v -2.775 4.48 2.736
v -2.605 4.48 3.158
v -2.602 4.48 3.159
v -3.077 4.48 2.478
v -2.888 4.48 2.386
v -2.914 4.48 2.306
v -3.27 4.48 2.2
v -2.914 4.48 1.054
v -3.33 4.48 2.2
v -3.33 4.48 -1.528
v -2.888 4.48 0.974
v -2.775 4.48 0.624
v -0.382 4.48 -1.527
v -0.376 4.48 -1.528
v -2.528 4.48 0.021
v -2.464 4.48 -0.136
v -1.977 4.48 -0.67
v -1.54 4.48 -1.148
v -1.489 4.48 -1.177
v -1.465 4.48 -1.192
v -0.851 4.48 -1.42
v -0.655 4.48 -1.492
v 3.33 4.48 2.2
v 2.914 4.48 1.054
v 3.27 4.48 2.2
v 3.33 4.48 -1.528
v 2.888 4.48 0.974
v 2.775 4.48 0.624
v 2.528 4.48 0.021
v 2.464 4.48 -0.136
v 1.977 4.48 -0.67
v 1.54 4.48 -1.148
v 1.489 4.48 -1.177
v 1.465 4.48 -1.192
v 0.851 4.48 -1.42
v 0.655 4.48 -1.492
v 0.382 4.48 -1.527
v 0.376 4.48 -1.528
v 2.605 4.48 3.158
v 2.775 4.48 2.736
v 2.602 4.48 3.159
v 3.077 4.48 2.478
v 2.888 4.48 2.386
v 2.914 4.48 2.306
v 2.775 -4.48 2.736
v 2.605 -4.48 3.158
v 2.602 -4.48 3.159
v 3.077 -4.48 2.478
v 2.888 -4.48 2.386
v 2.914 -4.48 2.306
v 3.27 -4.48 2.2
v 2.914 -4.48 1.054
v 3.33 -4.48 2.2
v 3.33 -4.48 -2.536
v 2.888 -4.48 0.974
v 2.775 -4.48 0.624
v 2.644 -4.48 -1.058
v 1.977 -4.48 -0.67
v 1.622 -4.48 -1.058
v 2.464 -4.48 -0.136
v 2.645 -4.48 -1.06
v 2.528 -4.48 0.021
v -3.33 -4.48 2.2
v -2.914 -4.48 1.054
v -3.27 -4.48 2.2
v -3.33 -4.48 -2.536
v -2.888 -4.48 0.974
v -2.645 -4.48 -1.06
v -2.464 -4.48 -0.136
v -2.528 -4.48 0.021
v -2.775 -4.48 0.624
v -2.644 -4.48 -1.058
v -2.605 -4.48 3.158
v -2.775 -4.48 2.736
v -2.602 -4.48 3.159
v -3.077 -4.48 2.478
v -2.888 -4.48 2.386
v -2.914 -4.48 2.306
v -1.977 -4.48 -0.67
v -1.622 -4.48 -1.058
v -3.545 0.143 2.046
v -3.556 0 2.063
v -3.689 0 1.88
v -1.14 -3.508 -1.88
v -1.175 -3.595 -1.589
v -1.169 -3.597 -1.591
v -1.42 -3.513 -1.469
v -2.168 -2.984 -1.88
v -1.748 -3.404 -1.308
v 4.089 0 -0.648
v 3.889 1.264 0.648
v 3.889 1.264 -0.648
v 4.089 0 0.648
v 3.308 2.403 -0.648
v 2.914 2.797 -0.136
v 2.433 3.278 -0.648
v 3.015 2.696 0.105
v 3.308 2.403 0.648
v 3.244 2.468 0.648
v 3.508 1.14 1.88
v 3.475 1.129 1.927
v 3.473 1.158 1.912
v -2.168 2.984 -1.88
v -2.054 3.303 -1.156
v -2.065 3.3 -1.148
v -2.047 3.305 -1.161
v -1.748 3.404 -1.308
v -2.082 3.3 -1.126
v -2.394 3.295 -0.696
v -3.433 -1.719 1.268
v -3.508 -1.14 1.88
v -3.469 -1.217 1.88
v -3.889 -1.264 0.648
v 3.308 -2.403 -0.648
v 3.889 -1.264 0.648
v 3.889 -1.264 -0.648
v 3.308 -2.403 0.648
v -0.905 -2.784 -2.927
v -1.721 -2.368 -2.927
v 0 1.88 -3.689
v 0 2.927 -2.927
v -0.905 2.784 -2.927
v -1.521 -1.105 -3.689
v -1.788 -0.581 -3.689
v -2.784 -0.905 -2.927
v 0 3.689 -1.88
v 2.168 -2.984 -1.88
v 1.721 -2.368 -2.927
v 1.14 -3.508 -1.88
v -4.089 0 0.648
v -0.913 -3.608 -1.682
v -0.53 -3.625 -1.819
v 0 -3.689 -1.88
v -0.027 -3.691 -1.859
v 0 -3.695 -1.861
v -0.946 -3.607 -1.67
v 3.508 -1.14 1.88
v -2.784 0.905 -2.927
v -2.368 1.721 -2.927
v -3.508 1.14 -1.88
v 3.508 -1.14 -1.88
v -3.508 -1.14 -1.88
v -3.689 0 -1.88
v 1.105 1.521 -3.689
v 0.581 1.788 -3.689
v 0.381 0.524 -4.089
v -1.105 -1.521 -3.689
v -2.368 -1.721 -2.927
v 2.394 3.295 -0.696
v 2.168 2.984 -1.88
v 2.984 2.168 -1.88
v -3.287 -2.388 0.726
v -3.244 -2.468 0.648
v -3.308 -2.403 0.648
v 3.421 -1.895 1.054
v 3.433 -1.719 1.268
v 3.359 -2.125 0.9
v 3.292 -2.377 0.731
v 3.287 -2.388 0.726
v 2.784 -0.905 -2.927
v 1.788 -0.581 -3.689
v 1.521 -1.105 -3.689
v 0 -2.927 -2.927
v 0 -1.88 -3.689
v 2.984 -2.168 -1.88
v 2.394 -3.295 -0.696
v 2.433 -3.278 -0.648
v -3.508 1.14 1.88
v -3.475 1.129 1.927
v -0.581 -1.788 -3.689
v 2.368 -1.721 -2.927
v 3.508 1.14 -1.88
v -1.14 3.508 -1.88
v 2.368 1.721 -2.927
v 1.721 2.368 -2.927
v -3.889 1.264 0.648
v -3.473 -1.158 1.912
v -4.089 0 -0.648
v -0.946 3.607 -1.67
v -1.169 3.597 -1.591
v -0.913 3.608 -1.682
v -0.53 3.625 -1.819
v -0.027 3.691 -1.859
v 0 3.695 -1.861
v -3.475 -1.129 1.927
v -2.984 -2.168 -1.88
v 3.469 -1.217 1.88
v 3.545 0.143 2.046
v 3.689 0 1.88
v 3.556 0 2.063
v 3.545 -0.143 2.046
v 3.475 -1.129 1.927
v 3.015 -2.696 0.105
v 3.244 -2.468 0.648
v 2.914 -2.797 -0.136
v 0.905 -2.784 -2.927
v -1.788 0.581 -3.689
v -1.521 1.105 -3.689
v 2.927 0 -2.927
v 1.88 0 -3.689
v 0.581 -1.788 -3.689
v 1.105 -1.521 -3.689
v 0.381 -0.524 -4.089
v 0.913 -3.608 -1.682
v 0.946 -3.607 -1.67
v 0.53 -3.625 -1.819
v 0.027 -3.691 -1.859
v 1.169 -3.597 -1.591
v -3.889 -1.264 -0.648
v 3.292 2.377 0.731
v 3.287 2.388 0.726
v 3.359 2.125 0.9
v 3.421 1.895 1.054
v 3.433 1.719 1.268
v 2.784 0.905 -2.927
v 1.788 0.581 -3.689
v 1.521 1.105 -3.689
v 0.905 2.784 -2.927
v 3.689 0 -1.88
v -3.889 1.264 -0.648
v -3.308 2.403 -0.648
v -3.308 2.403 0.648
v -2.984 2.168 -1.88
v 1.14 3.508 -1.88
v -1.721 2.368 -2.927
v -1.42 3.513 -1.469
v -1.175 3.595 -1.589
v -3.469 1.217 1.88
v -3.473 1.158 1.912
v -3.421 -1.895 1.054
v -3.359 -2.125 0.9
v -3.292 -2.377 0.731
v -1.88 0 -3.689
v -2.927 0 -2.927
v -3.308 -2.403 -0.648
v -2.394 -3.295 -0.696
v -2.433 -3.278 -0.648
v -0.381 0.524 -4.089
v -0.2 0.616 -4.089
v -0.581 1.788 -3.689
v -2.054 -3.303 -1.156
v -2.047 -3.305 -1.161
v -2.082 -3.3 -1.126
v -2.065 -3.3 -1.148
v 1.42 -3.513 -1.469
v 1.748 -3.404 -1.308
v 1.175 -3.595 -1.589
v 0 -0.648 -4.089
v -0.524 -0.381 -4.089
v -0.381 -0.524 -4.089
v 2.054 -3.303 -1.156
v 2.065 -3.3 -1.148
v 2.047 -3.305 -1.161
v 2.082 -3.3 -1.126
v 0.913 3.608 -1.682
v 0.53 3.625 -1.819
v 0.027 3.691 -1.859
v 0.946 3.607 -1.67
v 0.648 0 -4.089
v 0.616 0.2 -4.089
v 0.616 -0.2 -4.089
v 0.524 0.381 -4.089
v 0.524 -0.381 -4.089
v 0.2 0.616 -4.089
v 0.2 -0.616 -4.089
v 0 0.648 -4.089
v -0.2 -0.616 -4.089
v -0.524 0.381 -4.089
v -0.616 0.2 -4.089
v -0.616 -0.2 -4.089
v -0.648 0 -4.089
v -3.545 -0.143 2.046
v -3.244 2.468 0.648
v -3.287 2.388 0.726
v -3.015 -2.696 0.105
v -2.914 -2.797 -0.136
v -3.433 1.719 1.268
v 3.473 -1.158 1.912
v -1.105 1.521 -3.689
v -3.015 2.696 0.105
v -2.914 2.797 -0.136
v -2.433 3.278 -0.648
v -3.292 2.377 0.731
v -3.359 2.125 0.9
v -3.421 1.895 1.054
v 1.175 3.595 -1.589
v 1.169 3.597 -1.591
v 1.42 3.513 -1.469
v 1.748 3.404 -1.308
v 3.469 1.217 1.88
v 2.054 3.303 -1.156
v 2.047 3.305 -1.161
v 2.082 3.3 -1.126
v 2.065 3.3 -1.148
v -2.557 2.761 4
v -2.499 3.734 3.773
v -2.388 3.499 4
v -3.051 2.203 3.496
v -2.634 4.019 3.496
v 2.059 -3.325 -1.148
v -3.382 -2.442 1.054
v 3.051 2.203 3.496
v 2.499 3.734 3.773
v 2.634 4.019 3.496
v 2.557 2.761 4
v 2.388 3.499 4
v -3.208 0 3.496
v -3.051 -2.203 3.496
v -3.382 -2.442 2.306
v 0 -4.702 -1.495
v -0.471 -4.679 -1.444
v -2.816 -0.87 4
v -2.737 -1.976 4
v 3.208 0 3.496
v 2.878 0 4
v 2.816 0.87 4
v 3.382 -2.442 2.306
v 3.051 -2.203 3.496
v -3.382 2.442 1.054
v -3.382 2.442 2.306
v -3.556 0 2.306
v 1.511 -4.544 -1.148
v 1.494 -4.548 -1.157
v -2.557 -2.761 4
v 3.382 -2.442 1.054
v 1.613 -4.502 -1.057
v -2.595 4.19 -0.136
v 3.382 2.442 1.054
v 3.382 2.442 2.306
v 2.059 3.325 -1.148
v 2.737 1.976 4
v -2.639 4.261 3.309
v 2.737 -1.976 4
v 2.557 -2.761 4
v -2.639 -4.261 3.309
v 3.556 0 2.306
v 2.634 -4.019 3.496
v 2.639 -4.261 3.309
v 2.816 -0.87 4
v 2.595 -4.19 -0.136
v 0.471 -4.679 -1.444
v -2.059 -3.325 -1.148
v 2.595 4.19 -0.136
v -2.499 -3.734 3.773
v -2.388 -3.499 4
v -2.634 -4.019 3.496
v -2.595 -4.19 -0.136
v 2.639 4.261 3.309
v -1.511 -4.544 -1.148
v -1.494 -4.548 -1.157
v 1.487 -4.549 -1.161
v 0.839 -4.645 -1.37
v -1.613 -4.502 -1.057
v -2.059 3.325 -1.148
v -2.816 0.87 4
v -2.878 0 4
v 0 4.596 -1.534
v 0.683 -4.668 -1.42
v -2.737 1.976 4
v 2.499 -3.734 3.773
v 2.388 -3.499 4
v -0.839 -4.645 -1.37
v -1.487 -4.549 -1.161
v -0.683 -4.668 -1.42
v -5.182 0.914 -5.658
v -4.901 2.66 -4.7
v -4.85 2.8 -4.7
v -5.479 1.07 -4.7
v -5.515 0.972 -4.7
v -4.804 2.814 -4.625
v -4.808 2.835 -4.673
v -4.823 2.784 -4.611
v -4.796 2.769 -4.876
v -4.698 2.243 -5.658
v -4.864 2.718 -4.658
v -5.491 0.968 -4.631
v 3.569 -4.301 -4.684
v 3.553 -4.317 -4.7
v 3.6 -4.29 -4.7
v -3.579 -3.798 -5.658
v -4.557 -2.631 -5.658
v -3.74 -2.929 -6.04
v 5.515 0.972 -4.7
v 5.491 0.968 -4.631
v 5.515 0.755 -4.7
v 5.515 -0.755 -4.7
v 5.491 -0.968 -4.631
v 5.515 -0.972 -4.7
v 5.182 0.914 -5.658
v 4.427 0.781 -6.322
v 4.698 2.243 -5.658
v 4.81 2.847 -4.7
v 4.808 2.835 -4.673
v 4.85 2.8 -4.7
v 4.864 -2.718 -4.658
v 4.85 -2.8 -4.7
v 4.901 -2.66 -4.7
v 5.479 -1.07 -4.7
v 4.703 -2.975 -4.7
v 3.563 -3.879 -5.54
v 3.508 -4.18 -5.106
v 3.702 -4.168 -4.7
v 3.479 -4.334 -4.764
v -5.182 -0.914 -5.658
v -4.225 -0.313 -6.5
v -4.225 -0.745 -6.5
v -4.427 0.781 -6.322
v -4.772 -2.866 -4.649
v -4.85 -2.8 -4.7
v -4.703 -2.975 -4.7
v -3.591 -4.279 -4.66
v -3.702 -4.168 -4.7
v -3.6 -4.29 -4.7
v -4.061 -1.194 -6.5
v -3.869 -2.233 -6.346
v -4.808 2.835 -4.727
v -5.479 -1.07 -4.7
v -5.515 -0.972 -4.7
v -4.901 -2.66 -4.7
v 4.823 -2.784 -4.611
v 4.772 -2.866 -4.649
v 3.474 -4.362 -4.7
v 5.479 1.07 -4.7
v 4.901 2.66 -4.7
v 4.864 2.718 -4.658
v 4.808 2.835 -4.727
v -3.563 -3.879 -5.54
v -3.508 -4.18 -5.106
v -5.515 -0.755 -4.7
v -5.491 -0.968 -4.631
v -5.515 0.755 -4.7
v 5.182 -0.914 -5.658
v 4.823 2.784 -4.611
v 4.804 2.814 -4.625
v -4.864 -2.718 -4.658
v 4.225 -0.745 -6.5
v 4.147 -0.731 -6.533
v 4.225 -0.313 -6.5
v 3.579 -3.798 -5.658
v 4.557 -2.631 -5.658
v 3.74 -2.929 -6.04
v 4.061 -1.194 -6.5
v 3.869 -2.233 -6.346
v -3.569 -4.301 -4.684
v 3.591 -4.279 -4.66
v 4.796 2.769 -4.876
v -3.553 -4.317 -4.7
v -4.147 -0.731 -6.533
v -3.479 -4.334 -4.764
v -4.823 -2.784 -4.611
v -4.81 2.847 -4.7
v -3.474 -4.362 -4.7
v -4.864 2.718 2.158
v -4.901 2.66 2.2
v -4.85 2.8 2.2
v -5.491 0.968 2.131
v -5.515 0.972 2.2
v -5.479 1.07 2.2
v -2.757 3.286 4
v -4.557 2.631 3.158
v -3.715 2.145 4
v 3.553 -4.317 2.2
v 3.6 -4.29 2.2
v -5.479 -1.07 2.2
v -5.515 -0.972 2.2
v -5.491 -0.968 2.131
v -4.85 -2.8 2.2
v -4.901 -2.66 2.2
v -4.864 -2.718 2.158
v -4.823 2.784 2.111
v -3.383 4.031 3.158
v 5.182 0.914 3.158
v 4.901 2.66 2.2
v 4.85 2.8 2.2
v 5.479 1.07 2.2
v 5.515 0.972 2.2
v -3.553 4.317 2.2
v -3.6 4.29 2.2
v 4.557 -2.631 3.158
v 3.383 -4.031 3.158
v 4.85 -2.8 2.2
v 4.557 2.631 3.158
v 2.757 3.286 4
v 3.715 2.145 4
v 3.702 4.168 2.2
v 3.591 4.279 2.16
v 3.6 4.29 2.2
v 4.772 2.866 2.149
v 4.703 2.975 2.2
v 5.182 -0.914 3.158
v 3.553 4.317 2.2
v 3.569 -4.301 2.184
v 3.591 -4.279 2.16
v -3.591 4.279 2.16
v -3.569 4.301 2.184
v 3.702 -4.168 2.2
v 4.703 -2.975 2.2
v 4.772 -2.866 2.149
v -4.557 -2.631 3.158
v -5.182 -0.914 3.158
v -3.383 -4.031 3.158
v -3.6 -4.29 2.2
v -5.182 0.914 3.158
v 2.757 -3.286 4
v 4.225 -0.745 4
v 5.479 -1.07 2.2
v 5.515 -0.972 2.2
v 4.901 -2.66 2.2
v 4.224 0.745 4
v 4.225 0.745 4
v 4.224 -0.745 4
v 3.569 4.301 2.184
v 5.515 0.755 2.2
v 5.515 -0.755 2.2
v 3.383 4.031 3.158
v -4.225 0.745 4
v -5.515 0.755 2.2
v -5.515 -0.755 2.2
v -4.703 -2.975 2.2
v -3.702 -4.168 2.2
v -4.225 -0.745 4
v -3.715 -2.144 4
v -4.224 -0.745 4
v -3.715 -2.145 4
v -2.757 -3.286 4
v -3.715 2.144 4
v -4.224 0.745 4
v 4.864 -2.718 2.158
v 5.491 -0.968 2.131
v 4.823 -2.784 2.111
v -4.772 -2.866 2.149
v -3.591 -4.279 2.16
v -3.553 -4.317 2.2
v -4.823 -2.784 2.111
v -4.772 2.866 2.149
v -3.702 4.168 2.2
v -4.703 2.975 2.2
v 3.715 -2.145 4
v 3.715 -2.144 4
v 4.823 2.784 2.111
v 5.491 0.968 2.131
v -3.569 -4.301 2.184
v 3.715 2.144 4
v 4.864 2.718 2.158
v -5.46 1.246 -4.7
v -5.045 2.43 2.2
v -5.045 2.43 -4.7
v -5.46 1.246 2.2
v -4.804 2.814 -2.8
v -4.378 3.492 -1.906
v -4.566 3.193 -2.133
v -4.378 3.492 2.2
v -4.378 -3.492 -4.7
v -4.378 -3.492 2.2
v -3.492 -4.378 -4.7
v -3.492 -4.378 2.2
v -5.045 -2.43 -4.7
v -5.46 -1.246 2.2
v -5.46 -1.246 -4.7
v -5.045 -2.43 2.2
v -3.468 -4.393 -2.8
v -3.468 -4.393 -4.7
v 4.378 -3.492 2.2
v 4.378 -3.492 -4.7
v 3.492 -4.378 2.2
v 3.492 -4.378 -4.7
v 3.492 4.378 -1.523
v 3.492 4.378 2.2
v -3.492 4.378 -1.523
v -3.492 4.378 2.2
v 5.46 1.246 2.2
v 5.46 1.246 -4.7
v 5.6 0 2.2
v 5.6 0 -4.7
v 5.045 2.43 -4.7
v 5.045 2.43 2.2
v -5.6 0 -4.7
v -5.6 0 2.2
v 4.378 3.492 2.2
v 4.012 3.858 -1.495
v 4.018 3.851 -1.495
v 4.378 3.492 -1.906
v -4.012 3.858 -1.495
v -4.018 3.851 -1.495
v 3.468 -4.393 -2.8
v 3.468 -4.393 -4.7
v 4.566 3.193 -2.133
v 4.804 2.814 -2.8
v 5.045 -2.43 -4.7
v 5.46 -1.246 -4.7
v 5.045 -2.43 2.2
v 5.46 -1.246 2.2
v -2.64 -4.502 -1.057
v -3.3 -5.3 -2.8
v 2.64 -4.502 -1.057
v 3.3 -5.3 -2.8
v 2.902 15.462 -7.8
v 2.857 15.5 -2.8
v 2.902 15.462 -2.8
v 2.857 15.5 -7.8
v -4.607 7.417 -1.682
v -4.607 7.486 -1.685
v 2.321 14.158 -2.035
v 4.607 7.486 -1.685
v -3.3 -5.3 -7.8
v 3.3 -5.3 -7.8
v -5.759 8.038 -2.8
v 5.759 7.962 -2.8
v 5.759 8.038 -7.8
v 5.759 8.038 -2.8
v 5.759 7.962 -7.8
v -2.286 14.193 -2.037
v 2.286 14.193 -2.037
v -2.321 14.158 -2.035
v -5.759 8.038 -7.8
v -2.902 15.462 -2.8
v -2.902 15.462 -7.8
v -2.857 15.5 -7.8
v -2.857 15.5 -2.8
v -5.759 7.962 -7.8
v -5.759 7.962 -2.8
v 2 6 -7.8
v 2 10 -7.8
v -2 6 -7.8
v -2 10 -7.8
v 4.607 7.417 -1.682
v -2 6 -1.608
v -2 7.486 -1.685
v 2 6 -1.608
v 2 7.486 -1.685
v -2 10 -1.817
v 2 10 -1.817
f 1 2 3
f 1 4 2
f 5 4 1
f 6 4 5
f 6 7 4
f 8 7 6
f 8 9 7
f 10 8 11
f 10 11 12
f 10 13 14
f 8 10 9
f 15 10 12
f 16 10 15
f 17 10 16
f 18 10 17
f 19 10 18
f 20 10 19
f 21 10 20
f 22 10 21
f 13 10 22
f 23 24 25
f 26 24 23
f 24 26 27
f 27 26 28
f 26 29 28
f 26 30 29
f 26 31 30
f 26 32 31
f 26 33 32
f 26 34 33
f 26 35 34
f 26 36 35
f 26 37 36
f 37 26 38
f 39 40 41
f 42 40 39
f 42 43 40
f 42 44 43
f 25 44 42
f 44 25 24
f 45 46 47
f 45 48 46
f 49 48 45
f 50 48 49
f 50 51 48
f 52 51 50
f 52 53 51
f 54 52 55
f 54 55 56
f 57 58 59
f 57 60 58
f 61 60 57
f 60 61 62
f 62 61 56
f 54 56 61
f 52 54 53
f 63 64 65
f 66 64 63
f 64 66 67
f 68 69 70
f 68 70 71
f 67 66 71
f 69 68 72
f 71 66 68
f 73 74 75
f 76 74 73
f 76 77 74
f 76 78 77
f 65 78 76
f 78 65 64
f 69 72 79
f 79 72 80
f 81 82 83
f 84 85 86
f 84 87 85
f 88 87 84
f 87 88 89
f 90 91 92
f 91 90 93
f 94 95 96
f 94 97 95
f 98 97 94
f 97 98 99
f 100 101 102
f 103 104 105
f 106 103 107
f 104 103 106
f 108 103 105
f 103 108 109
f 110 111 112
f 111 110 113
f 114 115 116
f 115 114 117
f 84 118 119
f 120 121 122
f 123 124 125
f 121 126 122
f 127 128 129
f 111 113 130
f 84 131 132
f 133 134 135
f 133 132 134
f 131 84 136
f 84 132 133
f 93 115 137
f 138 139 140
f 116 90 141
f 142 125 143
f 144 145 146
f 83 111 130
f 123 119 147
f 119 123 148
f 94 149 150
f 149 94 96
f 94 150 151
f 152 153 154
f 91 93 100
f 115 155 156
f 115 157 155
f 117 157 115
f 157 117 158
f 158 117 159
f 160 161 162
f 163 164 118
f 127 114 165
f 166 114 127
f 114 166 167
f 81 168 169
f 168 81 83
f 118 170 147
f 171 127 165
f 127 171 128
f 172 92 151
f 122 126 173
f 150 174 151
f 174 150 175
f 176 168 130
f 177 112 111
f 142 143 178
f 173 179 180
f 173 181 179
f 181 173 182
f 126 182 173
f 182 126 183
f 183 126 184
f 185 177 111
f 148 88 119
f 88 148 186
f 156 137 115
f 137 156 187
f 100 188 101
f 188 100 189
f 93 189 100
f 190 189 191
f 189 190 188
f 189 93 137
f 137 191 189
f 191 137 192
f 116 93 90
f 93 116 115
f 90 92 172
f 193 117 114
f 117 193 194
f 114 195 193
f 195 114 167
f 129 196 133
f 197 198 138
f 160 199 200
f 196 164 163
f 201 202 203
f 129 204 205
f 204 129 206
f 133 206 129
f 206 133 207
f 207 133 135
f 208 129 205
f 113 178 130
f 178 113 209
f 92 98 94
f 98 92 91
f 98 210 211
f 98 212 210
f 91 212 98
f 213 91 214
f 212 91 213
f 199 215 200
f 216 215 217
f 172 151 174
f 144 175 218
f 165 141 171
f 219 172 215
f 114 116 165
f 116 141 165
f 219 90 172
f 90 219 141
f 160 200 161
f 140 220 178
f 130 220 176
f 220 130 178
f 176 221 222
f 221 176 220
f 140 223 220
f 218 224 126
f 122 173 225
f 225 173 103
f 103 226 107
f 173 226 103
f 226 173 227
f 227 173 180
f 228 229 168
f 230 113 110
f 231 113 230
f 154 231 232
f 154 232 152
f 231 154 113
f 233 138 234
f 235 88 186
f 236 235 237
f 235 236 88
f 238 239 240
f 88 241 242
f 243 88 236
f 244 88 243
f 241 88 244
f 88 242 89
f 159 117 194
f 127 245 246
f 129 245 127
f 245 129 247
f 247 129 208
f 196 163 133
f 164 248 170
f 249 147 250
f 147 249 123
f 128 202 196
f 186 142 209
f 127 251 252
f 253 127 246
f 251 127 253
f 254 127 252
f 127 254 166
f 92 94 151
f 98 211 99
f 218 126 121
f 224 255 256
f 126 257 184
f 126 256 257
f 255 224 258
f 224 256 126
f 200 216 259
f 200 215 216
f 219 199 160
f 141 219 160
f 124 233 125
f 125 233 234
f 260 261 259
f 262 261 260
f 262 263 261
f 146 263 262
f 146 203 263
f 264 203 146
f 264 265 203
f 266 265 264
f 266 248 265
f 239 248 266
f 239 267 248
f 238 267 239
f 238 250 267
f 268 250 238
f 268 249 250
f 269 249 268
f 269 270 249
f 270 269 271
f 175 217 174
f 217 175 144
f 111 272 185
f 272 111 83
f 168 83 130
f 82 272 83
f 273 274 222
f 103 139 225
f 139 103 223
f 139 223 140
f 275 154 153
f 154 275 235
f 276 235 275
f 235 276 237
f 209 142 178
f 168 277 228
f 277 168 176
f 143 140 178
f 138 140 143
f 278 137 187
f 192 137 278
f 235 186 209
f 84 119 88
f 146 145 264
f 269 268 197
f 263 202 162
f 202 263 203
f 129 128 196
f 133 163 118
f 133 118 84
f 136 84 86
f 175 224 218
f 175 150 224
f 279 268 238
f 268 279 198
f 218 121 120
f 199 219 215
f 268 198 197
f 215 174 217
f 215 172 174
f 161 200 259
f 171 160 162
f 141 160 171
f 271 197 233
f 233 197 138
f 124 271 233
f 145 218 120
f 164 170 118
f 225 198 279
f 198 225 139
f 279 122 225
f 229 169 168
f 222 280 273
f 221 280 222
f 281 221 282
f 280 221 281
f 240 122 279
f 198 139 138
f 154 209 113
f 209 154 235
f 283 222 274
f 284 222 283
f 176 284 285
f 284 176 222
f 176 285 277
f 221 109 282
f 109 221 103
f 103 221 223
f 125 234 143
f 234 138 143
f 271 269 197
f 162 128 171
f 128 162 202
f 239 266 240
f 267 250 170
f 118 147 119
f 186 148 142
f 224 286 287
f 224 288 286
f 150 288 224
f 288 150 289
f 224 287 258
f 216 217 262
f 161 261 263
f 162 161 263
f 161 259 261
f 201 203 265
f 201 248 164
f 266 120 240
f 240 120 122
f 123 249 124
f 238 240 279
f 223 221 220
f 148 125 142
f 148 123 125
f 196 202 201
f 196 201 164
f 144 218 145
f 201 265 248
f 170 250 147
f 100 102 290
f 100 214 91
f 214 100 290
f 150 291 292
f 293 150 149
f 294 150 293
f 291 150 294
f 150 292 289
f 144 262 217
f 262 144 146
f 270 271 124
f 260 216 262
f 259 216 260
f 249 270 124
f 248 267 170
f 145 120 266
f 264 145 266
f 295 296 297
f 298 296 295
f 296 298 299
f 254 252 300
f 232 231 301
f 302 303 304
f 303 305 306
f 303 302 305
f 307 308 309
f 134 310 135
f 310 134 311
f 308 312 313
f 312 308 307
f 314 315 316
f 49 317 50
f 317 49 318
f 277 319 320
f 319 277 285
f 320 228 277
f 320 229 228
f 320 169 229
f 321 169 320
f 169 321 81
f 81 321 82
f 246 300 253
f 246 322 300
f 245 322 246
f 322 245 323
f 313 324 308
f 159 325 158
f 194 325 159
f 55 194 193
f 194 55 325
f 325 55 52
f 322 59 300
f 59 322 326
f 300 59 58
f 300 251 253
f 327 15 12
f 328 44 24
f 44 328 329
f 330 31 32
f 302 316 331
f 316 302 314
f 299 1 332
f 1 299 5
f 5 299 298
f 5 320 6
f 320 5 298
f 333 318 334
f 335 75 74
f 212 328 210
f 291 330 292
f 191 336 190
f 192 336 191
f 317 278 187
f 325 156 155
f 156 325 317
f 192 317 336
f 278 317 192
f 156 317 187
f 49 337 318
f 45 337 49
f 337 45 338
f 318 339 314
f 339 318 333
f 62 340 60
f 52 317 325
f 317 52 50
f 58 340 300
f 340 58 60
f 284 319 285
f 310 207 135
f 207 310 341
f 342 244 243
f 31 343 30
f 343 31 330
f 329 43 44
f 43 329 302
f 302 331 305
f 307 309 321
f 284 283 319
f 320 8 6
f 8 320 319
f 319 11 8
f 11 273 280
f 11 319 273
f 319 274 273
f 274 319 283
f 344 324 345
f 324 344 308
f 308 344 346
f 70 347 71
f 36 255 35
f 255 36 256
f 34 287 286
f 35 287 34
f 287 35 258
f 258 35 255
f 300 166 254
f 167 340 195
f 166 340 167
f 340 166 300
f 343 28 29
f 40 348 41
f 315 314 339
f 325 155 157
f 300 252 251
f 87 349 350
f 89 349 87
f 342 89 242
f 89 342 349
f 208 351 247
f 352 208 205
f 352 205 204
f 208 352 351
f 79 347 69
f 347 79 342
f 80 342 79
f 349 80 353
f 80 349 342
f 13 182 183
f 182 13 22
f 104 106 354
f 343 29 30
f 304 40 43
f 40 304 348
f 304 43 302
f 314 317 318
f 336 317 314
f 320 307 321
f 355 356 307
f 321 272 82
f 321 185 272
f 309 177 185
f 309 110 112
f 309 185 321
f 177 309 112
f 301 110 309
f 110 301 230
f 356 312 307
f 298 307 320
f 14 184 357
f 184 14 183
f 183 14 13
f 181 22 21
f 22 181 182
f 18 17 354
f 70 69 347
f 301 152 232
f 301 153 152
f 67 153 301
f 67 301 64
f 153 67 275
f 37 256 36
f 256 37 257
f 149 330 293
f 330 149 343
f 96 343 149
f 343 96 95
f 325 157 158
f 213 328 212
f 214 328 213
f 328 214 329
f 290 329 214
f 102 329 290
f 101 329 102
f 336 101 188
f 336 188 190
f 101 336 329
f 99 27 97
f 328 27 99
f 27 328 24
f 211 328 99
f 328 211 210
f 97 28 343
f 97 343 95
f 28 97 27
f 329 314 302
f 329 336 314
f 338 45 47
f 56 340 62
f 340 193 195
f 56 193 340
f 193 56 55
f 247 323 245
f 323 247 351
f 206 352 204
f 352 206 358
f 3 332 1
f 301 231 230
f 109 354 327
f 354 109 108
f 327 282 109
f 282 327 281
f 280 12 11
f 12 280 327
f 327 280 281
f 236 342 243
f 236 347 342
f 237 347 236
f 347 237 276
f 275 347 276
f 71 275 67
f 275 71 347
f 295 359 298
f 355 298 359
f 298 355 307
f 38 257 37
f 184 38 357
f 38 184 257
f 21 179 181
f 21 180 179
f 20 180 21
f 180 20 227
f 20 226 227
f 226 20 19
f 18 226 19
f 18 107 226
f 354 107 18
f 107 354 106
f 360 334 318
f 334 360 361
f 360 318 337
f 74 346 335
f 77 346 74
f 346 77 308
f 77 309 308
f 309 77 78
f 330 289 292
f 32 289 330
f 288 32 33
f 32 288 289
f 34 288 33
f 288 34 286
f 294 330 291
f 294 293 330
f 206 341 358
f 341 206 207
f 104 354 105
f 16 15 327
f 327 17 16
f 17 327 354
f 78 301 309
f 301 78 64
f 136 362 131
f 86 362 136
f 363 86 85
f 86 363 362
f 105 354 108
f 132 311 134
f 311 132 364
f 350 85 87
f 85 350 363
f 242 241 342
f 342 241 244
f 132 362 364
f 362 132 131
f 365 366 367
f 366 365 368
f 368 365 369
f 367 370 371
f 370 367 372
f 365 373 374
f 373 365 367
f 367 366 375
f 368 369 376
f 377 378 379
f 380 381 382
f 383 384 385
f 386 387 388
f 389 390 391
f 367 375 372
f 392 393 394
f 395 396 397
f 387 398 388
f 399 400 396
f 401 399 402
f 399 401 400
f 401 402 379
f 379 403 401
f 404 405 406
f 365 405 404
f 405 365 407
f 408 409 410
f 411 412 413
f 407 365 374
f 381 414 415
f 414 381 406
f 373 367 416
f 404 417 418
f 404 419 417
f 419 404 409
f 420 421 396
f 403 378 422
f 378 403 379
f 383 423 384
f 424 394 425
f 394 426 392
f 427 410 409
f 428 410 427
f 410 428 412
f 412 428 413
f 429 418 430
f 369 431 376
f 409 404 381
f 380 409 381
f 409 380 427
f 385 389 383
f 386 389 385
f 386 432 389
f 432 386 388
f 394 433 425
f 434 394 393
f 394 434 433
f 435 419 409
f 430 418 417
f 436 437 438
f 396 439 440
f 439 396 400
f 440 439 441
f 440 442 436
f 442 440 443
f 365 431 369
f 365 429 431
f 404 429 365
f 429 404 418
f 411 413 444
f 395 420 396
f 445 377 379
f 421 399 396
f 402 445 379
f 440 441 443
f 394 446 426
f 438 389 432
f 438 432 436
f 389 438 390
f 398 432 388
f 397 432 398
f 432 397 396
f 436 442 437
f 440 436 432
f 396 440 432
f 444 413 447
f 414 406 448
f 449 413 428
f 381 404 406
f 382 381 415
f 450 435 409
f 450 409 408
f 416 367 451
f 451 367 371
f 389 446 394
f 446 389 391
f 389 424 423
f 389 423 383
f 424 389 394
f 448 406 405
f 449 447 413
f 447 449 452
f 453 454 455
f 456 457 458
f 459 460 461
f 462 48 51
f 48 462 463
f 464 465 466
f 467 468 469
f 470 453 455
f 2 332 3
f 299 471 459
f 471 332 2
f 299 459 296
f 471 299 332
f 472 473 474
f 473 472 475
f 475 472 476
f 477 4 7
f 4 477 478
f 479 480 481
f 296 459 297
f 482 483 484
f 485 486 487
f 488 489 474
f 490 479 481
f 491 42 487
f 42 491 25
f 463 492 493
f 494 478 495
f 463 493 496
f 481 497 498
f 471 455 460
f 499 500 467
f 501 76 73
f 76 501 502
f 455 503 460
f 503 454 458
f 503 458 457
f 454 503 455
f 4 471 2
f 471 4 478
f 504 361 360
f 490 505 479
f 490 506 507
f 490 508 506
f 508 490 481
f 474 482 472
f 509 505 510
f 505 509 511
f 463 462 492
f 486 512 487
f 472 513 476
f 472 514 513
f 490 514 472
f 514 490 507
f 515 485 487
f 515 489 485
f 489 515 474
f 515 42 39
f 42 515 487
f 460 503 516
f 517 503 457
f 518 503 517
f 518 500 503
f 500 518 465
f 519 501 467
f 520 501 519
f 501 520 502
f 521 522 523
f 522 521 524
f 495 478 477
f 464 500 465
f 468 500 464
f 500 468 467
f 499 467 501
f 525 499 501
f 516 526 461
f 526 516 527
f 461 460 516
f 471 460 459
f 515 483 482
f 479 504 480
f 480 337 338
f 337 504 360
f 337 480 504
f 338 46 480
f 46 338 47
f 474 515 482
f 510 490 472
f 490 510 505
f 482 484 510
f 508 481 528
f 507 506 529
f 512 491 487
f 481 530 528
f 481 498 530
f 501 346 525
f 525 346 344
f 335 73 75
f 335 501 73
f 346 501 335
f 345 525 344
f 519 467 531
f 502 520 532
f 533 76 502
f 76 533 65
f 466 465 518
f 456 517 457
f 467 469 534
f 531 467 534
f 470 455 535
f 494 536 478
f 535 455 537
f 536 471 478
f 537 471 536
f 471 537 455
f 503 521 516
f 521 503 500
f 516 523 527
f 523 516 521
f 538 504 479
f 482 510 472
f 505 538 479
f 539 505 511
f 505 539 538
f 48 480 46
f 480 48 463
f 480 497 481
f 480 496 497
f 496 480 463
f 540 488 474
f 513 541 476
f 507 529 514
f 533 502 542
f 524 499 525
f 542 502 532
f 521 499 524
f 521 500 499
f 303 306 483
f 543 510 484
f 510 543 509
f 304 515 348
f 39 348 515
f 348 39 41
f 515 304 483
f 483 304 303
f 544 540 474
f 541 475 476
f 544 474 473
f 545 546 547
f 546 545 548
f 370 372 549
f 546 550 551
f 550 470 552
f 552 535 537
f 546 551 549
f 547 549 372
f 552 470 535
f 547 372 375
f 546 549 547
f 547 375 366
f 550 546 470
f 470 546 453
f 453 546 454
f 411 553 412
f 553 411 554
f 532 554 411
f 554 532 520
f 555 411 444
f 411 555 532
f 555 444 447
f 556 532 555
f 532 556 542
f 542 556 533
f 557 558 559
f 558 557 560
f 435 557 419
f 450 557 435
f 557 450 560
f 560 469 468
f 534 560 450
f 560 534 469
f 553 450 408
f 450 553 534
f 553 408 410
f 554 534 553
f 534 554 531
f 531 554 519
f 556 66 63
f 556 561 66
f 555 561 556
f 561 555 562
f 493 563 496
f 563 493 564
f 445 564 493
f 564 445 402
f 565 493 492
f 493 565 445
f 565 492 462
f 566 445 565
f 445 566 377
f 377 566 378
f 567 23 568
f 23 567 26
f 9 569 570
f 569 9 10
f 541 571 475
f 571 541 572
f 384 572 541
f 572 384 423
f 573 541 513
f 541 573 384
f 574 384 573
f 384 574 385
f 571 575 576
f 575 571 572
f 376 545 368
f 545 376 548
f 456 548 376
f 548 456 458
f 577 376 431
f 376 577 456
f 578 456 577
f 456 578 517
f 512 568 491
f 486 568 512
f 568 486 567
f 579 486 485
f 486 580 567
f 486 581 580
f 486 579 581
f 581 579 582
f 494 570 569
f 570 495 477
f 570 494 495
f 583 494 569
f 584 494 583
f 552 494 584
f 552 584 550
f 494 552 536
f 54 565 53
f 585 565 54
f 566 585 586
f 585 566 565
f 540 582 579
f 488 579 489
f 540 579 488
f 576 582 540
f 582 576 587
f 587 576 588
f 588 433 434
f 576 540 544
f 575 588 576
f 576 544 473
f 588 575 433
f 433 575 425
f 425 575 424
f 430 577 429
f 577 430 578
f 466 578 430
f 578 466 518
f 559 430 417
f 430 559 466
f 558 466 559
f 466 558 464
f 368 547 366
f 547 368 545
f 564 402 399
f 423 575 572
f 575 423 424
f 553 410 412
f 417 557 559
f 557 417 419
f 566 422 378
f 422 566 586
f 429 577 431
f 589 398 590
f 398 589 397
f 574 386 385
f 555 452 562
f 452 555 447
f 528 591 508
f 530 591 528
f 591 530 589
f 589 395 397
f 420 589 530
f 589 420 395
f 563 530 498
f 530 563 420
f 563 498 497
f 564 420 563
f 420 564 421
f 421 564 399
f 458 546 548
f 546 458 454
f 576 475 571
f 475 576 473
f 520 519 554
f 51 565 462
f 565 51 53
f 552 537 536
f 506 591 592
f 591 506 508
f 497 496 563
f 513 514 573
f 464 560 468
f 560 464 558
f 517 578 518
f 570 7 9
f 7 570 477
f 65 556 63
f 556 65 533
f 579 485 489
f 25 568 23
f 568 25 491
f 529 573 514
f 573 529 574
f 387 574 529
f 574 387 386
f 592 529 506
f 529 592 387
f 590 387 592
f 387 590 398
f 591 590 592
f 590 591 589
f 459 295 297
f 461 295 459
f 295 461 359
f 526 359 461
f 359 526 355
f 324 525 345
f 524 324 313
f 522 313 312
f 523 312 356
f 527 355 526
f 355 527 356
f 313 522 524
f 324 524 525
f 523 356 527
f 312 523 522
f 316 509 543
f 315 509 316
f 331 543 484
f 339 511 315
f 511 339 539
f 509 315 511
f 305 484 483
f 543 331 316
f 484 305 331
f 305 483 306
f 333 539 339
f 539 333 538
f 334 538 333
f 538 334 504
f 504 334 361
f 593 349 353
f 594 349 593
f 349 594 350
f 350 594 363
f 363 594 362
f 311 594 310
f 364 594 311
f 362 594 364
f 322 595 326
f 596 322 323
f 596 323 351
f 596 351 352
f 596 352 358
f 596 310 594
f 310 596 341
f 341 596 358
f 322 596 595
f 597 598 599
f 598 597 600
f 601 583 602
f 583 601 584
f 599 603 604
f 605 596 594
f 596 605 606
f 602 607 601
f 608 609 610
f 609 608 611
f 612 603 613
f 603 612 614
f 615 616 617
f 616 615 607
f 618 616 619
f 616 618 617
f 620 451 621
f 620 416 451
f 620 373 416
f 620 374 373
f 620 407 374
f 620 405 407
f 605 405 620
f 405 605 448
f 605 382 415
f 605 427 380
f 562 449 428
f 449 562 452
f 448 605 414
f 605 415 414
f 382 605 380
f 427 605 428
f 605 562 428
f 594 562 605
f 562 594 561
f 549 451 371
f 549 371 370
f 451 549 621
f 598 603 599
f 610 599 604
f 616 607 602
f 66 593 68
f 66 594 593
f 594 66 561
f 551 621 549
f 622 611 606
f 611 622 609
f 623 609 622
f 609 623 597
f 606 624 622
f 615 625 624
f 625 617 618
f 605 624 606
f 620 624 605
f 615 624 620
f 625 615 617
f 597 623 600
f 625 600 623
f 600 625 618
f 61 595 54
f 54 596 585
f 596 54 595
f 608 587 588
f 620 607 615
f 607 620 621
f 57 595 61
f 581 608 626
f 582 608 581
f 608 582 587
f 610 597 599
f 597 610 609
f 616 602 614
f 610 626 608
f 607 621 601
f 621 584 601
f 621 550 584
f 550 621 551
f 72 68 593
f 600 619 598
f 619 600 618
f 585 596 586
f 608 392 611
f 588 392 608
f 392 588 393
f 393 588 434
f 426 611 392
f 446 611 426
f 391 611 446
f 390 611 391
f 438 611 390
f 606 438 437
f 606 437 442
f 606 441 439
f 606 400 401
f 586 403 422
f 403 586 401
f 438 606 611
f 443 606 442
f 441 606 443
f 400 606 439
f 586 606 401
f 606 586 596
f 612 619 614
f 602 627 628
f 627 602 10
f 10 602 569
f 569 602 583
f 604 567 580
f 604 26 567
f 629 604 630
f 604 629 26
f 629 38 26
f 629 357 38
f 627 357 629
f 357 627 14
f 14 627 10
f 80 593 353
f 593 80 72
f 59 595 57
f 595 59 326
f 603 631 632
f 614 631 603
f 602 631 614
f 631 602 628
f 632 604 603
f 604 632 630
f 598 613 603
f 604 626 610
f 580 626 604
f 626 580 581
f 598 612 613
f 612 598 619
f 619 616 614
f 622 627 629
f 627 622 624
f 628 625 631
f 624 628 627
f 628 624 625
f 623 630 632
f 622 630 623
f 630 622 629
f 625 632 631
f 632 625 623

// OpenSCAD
ball_r = 4;
ball_support_h = 8;
ball_support_inner_r = 2;
ball_support_outer_r = 2.8;

/*
	0.05 : is pretty tight ( has caused splitting )
	0.07 : untested
	0.1 : is too loose
*/
socket_gap = 0.07;
socket_walls = 0.8;
socket_outer_r = ball_r + (2 * socket_walls);
socket_inner_r = ball_r + 2 * socket_gap;
socket_opening = (ball_support_inner_r + ball_support_outer_r) * 0.6;

mounting_dim = 4;

hand_inner_r = 2.5;
hand_d = 7;
hand_l = 10;

bicep_upper_r = 4.5;
bicep_upper_l = 18;
forearm_l = 14;
forearm_r = 4;

torso_l = 35;
torso_w = 30;
torso_r = socket_outer_r;

hips_l = 20;
hips_r = socket_outer_r;

femur_upper_r = 4.5;
femur_upper_l = 25;

head_l = 18;
head_r = socket_outer_r;

shin_upper_r = 4.5;
shin_upper_l = 30;

foot_d = 5;
foot_w = 10;
foot_l = 8;

module asm(){
	translate([0,0,torso_l + 0.7 * ball_support_h])head();
	torso();
	translate([0,torso_w * -0.5 + ball_support_h * -0.7,torso_l * 0.66]){
		bicep();
		translate([0,0,-0.9 * bicep_upper_l - socket_inner_r + 1 - ball_support_h]){
			forearm();
			translate([0,0,-1 * forearm_l - 2*socket_inner_r + 2]){
				rotate([0,0,90])hand();
			}
		}
		translate([0,-2 * (torso_w * -0.5 + ball_support_h * -0.7),0])rotate([0,0,180]){
			bicep();
			translate([0,0,-0.9 * bicep_upper_l - socket_inner_r + 1 - ball_support_h]){
				forearm();
				translate([0,0,-1 * forearm_l - 2*socket_inner_r + 2]){
					rotate([0,0,90])hand();
				}
			}
		}
	}
	translate([0,0,-0.7 * ball_support_h]){
		rotate([0,0,90]){
			hips();
			translate([-1.1 * ball_support_h,0,hips_l * -0.7]) {
				rotate([0,0,180])femur();
				translate([0,0,-0.9 * femur_upper_l - socket_inner_r + 1 - ball_support_h]){
					shin();
					translate([0,0,-0.9 * shin_upper_l - socket_inner_r + 1 - ball_support_h]){
						rotate([0,0,180])foot();
					}
				}
			}
			rotate([0,0,180]){
				translate([-1.1 * ball_support_h,0,hips_l * -0.7]) {
					rotate([0,0,180])femur();
					translate([0,0,-0.9 * femur_upper_l - socket_inner_r + 1 - ball_support_h]){
						rotate([0,0,180])shin();
						translate([0,0,-0.9 * shin_upper_l - socket_inner_r + 1 - ball_support_h]){
							foot();
						}
					}
				}
			}
		}
	}
}

//rotate([0,90,0])torso();
//rotate([90,0,90])bicep();
//rotate([90,0,90])forearm();
//rotate([90,0,90])hand();
//rotate([90,0,90])hips();
//rotate([90,90,0])femur();
//rotate([0,90,90])head();
//rotate([90,0,90])shin();
foot();
//rotate([90,90,90])sword();
//rotate([90,90,90])knife();

//asm();

//translate([0,50,-50])sword();

module knife(){
	cylinder(r1 = hand_inner_r, r2 = hand_inner_r, hand_d * 1.5);
	scale([1.5,3,1])translate([0,0,hand_d * 1.5])rotate([0,0,90])hexagon(3, 2);
	blade_h = 20;
	blade_tip = 7;
	hull(){
		scale([1,3,1])translate([0,0,hand_d * 1.5 + blade_h * 0.5])rotate([0,0,90])hexagon(2, blade_h);
		translate([0,2,hand_d * 1.5 + blade_h + blade_tip])sphere(r=1);
	}
}


module sword(){
	sphere(r=hand_inner_r * 1.5);
	cylinder(r1 = hand_inner_r, r2 = hand_inner_r, hand_d * 2.5);
	scale([1,3,1])translate([0,0,hand_d * 2.5])rotate([0,0,90])hexagon(8, 2);
	blade_h = 80;
	blade_tip = 10;
	hull(){
		scale([1,3,1])translate([0,0,hand_d * 2.5 + blade_h * 0.5])rotate([0,0,90])hexagon(3, blade_h);
		translate([0,0,hand_d * 2.5 + blade_h + blade_tip])sphere(r=1);
	}
}


module foot(){
	difference(){
		union(){
			180_socket();
			translate([0,0,-1 * foot_d - socket_outer_r * 0.5]){
				hull(){
					foot_part();
					translate([0,0,1.5])rotate([-3,0,0])scale([0.8,0.9,1])foot_part();
				}
			}
			difference(){
				translate([0,0,-7.5])rotate([0,0,90])flat_cylinder(12.5,socket_outer_r);
				translate([0,0,9])cube([10,10,10], center = true);
			}
		}
		180_socket_hollow();
		translate([0,foot_l,-1 * foot_d])rotate([00,0,90])mounting(mounting_dim, 2 * foot_d);
	}
}

module foot_part(){
	hull(){
		translate([0,foot_l,0.5 * foot_d])scale([1,1.5,1])rotate([0,0,90])hexagon(foot_w, foot_d);
		translate([-0.33 * foot_w, -0.33 * foot_w - 2,0])cube([0.66 * foot_w, 0.66 * foot_w, foot_d]);
	}
}

module shin(){
	union(){
		difference(){
			union(){
				90_socket(hole=false);
				translate([0,0,-1 * shin_upper_l - socket_inner_r + 1])rotate([0,0,0])flat_cylinder(shin_upper_l, shin_upper_r);
			}
			translate([0,0,-0.24 * shin_upper_l - socket_inner_r + 1])rotate([90,0,90])mounting(mounting_dim, 10);
			translate([0,0,-0.50 * shin_upper_l - socket_inner_r + 1])rotate([90,0,90])mounting(mounting_dim, 10);
			translate([0,0,-0.75 * shin_upper_l - socket_inner_r + 1])rotate([90,0,90])mounting(mounting_dim, 10);
			90_socket_hollow();
		}
		translate([0,0,-0.9 * shin_upper_l - socket_inner_r + 1 - ball_support_h])ball();
	}
}

module head(){
	rotate([0,180,90]){
		difference(){
			union(){
				intersection(){
					translate([0,0,-1 * head_l + socket_outer_r * 0.5])rotate([0,0,90])flat_cylinder(head_l * 2, head_r);			
					90_socket();
				}
				translate([0,0,-1 * head_l + socket_outer_r * 0.5])rotate([0,0,90])flat_cylinder(head_l, head_r);
			}
			90_socket_hollow();
			90_socket_hollow_angle();
			translate([0,0, -0.45 * head_l])rotate([90,0,0])mounting(mounting_dim, 2 * head_r);
		}
	}
}

module femur(){
	union(){
		difference(){
			union(){
				rotate([0,0,90])90_socket(hole=false);
				translate([0,0,-1 * femur_upper_l - socket_inner_r + 1])rotate([0,0,0])flat_cylinder(femur_upper_l, femur_upper_r);
			}
			translate([0,0,-0.33 * femur_upper_l - socket_inner_r + 1])rotate([90,0,90])mounting(mounting_dim, 10);
			translate([0,0,-0.66 * femur_upper_l - socket_inner_r + 1])rotate([90,0,90])mounting(mounting_dim, 10);
			90_socket_hollow();
		}
		translate([0,0,-0.9 * femur_upper_l - socket_inner_r + 1 - ball_support_h])ball();
	}
}


module hips(){
	hip_socket_r = 6;
	hip_socket_h = -0.55 * hips_l;
	difference(){
		union(){
			180_socket();
			translate([0,0,-1 * hips_l + socket_outer_r * 0.5])rotate([0,0,90])flat_cylinder(hips_l, hips_r);
		}
		180_socket_hollow();
		translate([0,0, -0.35 * hips_l])rotate([90,0,0])mounting(mounting_dim, 2 * hips_r);
		scale([1,1,1.5]){
			translate([hips_r * 1.5,hips_r, hip_socket_h])rotate([90,0,0])cylinder(r1 = hip_socket_r, r2 = hip_socket_r, h=2*hips_r);
			translate([hips_r * -1.5,hips_r,hip_socket_h])rotate([90,0,0])cylinder(r1 = hip_socket_r, r2 = hip_socket_r, h=2*hips_r);
		}
	}
	translate([-1.1 * ball_support_h,0,hips_l * -0.7])rotate([0,90,0])ball();
	translate([1.1 * ball_support_h,0,hips_l * -0.7])rotate([0,-90,0])ball();
}

module torso(){
	difference(){
		union(){
			flat_cylinder(torso_l, torso_r);
			translate([0,-0.5 * torso_w,0.66 * torso_l])rotate([0,90,90])rotate([0,0,90])flat_cylinder(torso_w, torso_r);
			translate([0,0,-0.7 * ball_support_h])ball();
			translate([0,0,torso_l + 0.7 * ball_support_h])rotate([0,180,0])ball();
			translate([0,torso_w * 0.5 + 0.7 * ball_support_h ,0.66 * torso_l])rotate([90,0,0])ball();
			translate([0,torso_w * -0.5 + -0.7 * ball_support_h ,0.66 * torso_l])rotate([270,0,0])ball();
		}
		translate([0, torso_w * 0.3 , 0.66 * torso_l])rotate([90,0,90])mounting(mounting_dim, 2 * torso_r);
		translate([0, torso_w * -0.3 , 0.66 * torso_l])rotate([90,0,90])mounting(mounting_dim, 2 * torso_r);
		translate([0,0, 0.66 * torso_l])rotate([90,0,90])mounting(mounting_dim, 2 * torso_r);
		translate([0,0, 0.44 * torso_l])rotate([90,0,90])mounting(mounting_dim, 2 * torso_r);
		translate([0,0, 0.22 * torso_l])rotate([90,0,90])mounting(mounting_dim, 2 * torso_r);
	}
}

module hand(){
	union(){
		rotate([180,0,0])ball();
		translate([0,0,-1.31 * ball_support_h])
		rotate([90,0,0])
		difference(){
			hexagon(hand_l, hand_d);
			
			translate([0,0,-0.5 * hand_d - 1])cylinder(r1 = hand_inner_r, r2 = hand_inner_r, h = hand_d + 2);		
			translate([3.3,-3.3,0])rotate([0,0,90])cube([2.5 * hand_inner_r,2.5 * hand_inner_r,hand_d + 2], center = true);
		}
	}
	
}

module forearm(){
	difference(){
		union(){
			90_socket();
			translate([0,0,-1 * forearm_l - socket_inner_r + 1])rotate([0,0,90])flat_cylinder(forearm_l, forearm_r);
			translate([0,0,-1 * forearm_l - 2*socket_inner_r + 2])rotate([0,180,0])90_socket();
		}
		translate([0,0,-0.5 * forearm_l - socket_inner_r + 1])rotate([90,0,0])mounting(mounting_dim, 10);
		90_socket_hollow();
		translate([0,0,-1 * forearm_l - 2*socket_inner_r + 2])90_socket_hollow();
	}
}

module bicep(){
	union(){
		difference(){
			union(){
				90_socket(hole=false);
				translate([0,0,-1 * bicep_upper_l - socket_inner_r + 1])rotate([0,0,0])flat_cylinder(bicep_upper_l, bicep_upper_r);
			}
			translate([0,0,-0.5 * bicep_upper_l - socket_inner_r + 1])rotate([90,0,90])mounting(mounting_dim, 10);
			90_socket_hollow();
		}
		translate([0,0,-0.9 * bicep_upper_l - socket_inner_r + 1 - ball_support_h])ball();
	}
}


module flat_cylinder(l,r){
	difference(){
		union(){
			translate([0,0,0.5 * r])scale([1,1,0.5])sphere(r);
			translate([0,0,l - 0.5 * r])scale([1,1,0.5])sphere(r);
			translate([0,0,0.5 * r])cylinder(h = l - r, r1 = r, r2 = r, $fn = 5 * r);
		}
		difference(){
			
			translate([-1.6 * r,-2 * r,-0.5 * l])cube([r * 3.2, r *  4, 2*l]);
			translate([-0.8 * r,-1 * r,0])cube([r * 1.6, r *  2, l]);
		}
	}
}


module ball(){
	color([0.4,0,1]){
		union(){
			sphere(r = ball_r, $fn = 5*ball_r);
			cylinder(h = ball_support_h, r1 = ball_support_inner_r, r2 = ball_support_outer_r);
		}
	}
}

module 180_socket(){
	color([0.2,1,0.2]){
		difference(){
			intersection(){
				sphere(r = socket_outer_r, $fn = 5*socket_outer_r);
				translate([-1 * socket_outer_r, 0,-0.3 * socket_outer_r])rotate([0,90,0])cylinder(r1 = socket_outer_r, r2 = socket_outer_r, h=2 * socket_outer_r, $fn = 5*socket_outer_r);
				cube([30,socket_outer_r * 1.6,30],center=true);
			}
			180_socket_hollow();
		}
	}
}

module 180_socket_hollow(){
	90_socket_hollow();
	scale([0.9,2,1])translate([0 ,0 ,0.3 * socket_outer_r])sphere(r = ball_r, $fn = 5*ball_r);

}

module 90_socket(hole = false){
	color([1,0,0.4]){
		difference(){
			sphere(r = socket_outer_r, $fn = 5*socket_outer_r);
			90_socket_hollow();
			90_socket_hollow_angle()
			if(hole){
				rotate([90,0,0])cylinder(h=2 * socket_outer_r, r1 = ball_support_inner_r, r2 = ball_support_inner_r, $fn = 4*socket_opening);
				translate([0 , -1.4 * socket_outer_r, 0])sphere(r = ball_r, $fn = 5*ball_r);
			}
		}
	}
}

module 90_socket_hollow(){
	sphere(r = socket_inner_r, $fn = 5*socket_inner_r);
}

module 90_socket_hollow_angle(){
	translate([-1 * socket_opening,0,0])cube([2 * socket_opening, 10, 10]);
	translate([0 ,0 ,1 * socket_outer_r])sphere(r = ball_r, $fn = 5*ball_r);
	translate([0 , 1 * socket_outer_r, 0])sphere(r = ball_r, $fn = 5*ball_r);
	translate([0 , 0.6 * socket_outer_r, 0.6 * socket_outer_r])sphere(r = ball_r, $fn = 5*ball_r);
}

module mounting(size, height){
	//hexagon(size, height);
	translate([-0.5 * size, -0.5 * size,-0.5 * height])cube([size,size,height]);
}

module hexagon(size, height) {
	boxWidth = size/1.75;
	rotate([0,0,90])
	for (r = [-60, 0, 60]) rotate([0,0,r]) cube([boxWidth, size, height], true);
}
